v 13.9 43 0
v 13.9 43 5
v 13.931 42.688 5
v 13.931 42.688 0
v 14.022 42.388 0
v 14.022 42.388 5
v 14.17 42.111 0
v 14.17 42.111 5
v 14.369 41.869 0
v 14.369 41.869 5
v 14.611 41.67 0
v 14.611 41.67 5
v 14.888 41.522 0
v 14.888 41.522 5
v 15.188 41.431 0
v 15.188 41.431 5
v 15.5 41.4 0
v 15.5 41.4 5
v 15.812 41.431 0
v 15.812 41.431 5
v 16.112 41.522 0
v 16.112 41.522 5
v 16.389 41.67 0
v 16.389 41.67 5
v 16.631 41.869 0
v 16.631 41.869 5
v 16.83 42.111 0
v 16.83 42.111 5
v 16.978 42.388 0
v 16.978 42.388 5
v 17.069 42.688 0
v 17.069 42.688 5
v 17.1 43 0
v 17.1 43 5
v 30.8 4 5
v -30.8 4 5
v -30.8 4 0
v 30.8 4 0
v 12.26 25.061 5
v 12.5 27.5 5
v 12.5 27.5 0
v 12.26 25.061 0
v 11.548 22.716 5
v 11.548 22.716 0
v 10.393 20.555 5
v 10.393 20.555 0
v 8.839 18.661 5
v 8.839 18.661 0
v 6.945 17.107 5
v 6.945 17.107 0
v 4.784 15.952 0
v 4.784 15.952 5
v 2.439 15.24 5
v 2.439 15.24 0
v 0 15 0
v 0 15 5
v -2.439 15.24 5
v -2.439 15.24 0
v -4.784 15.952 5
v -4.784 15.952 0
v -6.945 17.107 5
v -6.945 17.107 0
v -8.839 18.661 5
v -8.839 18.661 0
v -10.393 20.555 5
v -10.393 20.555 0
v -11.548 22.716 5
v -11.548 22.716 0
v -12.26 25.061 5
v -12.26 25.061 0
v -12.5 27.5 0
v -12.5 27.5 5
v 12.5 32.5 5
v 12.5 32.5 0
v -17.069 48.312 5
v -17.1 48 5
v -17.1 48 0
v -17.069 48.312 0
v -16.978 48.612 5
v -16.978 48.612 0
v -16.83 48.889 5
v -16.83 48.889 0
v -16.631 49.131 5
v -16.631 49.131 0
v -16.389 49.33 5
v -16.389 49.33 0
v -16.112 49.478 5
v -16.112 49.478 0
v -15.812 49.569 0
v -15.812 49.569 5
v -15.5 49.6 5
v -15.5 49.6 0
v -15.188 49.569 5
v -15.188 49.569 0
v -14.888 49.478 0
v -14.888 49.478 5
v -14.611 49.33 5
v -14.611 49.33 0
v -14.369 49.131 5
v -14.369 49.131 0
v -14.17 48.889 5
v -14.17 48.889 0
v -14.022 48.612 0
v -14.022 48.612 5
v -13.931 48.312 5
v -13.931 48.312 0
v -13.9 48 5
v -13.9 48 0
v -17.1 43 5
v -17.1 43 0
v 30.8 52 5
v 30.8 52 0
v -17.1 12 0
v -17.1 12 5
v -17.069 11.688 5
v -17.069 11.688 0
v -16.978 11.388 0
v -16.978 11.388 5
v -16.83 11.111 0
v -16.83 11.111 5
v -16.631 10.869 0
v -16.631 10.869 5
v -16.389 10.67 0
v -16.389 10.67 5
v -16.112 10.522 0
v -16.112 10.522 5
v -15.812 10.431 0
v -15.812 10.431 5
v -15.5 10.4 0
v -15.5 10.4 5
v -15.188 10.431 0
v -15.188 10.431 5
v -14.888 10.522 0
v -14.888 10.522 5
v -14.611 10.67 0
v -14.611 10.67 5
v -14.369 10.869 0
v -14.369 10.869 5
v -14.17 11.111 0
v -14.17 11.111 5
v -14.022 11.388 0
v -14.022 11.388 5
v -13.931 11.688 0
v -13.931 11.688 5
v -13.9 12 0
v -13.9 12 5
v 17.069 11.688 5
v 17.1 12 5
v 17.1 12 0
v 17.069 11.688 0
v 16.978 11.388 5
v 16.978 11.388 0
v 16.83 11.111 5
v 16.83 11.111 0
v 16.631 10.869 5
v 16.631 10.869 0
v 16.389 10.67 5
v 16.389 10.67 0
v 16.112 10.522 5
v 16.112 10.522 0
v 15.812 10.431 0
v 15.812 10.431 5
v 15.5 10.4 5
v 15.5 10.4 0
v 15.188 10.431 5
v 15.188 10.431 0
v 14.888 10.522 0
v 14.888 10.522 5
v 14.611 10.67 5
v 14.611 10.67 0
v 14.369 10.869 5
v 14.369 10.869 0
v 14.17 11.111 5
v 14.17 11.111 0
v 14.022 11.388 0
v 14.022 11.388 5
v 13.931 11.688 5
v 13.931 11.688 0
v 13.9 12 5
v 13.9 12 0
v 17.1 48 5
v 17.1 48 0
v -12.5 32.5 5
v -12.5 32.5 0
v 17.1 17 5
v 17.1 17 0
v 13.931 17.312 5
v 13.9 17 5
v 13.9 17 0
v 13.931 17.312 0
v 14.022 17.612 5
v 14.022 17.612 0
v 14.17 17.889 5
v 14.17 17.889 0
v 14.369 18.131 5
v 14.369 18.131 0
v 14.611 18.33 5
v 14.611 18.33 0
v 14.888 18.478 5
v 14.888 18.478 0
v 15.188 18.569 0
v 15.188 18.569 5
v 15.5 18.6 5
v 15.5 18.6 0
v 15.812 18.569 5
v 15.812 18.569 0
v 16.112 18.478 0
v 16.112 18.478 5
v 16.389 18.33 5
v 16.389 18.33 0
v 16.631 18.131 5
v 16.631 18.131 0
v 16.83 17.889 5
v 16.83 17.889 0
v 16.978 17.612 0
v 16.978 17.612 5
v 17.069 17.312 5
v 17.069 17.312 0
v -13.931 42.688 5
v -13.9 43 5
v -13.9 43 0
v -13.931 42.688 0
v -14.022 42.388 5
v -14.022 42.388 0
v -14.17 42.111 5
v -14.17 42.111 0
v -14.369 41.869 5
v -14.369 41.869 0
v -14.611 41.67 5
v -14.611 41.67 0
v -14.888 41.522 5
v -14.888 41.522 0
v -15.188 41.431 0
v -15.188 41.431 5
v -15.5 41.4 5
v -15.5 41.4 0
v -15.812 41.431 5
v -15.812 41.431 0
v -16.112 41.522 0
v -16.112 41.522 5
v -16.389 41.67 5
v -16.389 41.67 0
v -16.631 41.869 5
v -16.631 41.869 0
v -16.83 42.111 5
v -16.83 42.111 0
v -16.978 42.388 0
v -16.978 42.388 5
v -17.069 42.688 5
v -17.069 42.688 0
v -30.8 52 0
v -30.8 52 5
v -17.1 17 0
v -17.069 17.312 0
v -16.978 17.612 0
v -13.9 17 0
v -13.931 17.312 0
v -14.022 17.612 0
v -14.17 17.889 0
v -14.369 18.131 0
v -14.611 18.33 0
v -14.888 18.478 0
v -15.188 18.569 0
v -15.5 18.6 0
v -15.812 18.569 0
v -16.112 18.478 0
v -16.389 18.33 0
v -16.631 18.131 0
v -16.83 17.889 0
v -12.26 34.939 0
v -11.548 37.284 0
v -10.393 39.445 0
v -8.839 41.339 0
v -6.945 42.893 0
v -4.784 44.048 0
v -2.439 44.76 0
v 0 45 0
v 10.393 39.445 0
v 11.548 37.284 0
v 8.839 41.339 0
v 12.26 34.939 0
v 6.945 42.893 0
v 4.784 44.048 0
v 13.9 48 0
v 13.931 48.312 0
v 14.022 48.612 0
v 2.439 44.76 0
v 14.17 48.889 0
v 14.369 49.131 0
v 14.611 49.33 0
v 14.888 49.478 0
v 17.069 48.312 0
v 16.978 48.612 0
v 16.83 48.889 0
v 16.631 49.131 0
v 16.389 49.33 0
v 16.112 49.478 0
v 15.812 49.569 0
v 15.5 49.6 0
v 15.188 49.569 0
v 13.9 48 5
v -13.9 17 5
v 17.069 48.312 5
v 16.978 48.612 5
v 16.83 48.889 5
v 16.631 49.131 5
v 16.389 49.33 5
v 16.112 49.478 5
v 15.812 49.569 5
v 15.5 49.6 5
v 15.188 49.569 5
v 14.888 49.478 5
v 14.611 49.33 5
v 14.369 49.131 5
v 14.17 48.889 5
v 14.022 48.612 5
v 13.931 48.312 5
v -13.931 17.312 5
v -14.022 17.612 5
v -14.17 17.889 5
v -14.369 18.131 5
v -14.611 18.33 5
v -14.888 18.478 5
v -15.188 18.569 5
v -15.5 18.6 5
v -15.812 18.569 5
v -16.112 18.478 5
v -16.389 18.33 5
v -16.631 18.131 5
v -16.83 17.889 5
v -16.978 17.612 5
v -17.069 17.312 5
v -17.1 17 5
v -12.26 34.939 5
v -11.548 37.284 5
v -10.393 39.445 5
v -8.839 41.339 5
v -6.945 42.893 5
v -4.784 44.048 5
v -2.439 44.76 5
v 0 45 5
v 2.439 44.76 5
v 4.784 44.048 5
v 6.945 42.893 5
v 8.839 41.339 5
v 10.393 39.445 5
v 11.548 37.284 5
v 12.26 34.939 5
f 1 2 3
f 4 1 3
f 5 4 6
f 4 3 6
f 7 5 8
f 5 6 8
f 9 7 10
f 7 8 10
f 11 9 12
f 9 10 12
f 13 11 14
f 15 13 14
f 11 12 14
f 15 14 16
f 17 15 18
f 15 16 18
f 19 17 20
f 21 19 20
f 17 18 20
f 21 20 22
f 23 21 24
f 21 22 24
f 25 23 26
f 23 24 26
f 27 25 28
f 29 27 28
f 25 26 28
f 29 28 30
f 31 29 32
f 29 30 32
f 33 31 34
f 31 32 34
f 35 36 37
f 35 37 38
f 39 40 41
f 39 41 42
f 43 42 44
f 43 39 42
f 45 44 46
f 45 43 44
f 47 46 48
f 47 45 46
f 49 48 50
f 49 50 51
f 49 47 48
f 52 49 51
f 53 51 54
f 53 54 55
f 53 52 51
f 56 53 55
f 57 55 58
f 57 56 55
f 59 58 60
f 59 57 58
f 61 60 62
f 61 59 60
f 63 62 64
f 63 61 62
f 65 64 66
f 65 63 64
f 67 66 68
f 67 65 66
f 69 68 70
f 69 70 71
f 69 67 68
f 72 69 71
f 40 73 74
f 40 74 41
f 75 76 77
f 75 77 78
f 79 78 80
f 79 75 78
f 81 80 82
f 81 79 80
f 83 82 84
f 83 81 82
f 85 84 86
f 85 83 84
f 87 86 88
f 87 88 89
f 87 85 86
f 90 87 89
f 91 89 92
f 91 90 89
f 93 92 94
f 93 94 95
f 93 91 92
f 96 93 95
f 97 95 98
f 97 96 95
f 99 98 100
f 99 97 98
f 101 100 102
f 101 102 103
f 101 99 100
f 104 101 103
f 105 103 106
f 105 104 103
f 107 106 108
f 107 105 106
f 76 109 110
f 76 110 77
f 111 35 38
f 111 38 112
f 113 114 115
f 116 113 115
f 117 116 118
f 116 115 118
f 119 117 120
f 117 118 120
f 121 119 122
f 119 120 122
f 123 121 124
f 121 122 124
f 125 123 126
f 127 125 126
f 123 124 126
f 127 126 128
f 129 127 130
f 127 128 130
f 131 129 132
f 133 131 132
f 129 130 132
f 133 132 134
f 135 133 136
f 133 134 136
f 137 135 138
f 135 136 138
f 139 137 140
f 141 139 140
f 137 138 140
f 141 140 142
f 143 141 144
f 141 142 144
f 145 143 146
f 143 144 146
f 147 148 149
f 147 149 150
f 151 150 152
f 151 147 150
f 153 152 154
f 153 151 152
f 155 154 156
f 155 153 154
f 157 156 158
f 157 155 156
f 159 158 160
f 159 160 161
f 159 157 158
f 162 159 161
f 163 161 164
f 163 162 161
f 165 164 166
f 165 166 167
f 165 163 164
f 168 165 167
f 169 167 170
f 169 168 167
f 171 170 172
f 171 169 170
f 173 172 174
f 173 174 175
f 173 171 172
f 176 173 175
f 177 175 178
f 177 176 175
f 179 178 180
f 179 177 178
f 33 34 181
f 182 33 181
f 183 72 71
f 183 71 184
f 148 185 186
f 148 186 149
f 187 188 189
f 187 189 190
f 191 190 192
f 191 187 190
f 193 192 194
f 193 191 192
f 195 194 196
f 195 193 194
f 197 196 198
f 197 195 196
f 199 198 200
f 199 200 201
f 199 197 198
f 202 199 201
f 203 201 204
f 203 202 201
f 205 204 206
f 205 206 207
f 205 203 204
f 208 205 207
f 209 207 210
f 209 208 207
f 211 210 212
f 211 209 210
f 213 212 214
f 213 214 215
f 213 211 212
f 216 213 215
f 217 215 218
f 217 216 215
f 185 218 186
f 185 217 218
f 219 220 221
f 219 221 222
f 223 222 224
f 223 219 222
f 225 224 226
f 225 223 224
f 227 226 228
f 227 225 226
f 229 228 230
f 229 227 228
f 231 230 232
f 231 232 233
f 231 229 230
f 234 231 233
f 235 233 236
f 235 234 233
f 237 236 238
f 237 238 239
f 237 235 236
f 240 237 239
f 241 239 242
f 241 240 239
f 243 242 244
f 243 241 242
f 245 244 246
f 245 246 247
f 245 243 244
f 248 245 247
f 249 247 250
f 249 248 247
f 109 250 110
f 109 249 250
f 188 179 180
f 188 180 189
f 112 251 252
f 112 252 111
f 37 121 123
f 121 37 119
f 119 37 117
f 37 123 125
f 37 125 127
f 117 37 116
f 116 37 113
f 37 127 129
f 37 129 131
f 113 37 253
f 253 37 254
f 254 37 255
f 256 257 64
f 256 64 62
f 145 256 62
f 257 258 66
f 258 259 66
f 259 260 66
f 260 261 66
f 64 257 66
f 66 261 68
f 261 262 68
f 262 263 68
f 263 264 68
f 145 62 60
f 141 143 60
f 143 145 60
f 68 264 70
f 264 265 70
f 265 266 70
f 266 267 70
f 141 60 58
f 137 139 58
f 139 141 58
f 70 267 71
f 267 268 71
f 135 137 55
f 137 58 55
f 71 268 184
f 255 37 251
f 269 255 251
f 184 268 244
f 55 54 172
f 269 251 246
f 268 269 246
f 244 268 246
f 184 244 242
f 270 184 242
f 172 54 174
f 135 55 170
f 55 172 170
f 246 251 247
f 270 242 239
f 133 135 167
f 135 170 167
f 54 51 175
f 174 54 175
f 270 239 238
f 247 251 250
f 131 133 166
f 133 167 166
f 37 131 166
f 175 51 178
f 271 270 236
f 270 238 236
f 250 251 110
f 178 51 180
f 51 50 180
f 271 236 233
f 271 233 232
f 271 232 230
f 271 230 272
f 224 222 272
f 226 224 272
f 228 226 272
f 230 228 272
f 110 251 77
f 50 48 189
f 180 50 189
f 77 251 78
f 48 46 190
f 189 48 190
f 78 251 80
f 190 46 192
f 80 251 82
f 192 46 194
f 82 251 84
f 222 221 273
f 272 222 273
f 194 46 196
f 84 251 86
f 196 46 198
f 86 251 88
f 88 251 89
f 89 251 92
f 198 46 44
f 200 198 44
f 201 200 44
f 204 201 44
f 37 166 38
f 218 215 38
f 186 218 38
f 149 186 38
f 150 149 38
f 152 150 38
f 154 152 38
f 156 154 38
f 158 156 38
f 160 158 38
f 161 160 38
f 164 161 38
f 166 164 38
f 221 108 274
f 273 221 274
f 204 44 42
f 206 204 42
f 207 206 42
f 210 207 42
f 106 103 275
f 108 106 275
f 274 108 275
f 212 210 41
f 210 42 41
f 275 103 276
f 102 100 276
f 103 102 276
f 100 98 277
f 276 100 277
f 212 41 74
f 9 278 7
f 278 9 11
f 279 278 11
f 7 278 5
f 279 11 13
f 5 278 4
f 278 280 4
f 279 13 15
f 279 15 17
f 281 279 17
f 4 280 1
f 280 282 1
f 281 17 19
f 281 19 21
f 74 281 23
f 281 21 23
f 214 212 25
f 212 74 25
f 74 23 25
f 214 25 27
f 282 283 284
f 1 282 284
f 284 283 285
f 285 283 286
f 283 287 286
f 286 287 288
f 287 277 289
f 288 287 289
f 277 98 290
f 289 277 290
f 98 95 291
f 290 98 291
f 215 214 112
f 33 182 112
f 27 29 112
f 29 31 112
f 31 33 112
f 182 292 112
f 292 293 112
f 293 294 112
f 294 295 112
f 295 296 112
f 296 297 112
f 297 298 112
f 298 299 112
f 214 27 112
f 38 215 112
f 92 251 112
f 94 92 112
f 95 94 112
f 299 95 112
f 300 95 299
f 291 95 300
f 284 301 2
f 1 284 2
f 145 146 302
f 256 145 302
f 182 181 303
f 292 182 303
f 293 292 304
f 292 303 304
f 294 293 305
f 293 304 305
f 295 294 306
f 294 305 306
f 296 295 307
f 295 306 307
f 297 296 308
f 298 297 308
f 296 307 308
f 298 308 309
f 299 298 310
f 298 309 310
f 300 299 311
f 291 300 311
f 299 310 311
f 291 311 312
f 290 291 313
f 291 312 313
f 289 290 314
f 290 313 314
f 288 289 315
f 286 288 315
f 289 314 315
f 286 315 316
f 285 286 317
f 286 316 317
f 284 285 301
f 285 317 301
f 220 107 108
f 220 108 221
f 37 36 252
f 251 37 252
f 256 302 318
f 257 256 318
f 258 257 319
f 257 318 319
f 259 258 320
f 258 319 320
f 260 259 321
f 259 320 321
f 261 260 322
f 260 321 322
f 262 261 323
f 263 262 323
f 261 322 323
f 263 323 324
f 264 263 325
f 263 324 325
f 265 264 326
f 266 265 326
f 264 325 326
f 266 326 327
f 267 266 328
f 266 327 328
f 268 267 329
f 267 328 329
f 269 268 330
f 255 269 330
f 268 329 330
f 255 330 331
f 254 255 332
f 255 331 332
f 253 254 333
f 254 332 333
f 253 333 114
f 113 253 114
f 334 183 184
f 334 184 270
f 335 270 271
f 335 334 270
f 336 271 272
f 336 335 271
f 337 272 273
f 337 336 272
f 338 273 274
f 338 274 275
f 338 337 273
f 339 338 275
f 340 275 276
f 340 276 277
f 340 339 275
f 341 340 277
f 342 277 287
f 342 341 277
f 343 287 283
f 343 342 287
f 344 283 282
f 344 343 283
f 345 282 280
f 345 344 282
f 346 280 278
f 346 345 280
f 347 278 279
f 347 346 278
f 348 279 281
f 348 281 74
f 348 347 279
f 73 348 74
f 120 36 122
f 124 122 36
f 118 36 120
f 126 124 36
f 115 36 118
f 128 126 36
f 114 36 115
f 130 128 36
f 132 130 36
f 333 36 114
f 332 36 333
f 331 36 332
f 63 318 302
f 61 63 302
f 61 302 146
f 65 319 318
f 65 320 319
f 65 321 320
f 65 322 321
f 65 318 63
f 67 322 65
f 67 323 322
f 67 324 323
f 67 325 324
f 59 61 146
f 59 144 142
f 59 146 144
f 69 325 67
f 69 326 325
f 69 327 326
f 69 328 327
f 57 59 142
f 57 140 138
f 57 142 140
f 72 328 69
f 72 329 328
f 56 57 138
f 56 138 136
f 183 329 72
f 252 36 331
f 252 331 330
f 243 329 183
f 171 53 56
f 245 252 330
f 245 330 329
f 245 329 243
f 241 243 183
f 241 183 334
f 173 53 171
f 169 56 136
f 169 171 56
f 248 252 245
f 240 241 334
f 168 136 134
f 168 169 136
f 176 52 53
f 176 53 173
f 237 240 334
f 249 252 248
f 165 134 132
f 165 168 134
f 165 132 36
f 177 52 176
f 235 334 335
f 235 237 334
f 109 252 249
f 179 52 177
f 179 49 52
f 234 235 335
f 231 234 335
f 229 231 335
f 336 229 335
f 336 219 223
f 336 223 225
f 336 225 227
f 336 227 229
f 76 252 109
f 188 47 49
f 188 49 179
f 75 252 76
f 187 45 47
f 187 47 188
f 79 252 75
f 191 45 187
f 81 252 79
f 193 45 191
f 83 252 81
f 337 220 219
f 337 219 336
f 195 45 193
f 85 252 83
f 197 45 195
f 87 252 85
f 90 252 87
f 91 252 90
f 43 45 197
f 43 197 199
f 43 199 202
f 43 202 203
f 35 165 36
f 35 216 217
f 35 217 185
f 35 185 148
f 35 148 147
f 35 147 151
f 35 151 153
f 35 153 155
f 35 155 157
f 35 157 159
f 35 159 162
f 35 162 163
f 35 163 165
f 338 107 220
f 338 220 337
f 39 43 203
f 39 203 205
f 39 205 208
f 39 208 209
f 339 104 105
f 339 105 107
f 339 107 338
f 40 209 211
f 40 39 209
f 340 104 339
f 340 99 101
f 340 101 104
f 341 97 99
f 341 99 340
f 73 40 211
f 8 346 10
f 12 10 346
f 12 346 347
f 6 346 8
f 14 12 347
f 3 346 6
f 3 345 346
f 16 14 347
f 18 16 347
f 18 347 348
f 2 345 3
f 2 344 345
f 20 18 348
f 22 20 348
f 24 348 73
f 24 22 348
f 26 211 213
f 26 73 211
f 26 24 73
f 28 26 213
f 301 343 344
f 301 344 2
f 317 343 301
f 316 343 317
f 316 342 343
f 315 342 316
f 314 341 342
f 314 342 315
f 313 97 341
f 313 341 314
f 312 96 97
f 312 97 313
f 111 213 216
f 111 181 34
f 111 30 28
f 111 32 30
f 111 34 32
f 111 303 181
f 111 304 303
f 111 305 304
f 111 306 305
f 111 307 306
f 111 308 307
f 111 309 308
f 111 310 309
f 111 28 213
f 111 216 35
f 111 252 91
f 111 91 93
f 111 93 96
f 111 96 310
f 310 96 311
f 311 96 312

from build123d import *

# Parameters (mm, degrees)
SKETCH1_W           = 61.6
SKETCH1_H           = 42
BOSS_EXTRUDE1_DEPTH = 5
CUT_EXTRUDE1_DEPTH  = 5
SKETCH3_W           = 61.6
SKETCH3_H           = 6
BOSS_EXTRUDE2_DEPTH = 5


with BuildPart() as part:
    # Sketch1 → Boss-Extrude1 (new body)
    with BuildSketch(Plane.XY):
        with Locations((0, 31)):
            Rectangle(SKETCH1_W, SKETCH1_H)
    extrude(amount=BOSS_EXTRUDE1_DEPTH)

    # Sketch2 → Cut-Extrude1 (cut)
    with BuildSketch(Plane.XY.offset(5)):
        with BuildLine():
            Line((-12.5, 27.5), (-12.5, 32.5))
            ThreePointArc((-12.5, 32.5), (0, 45), (12.5, 32.5))
            Line((12.5, 32.5), (12.5, 27.5))
            ThreePointArc((12.5, 27.5), (0, 15), (-12.5, 27.5))
        make_face()
        with BuildLine():
            Line((-17.1, 45.5), (-17.1, 48))
            ThreePointArc((-17.1, 48), (-15.5, 49.6), (-13.9, 48))
            Line((-13.9, 48), (-13.9, 45.5))
            Line((-13.9, 45.5), (-13.9, 43))
            ThreePointArc((-13.9, 43), (-15.5, 41.4), (-17.1, 43))
            Line((-17.1, 43), (-17.1, 45.5))
        make_face()
        with BuildLine():
            Line((-17.1, 14.5), (-17.1, 12))
            ThreePointArc((-17.1, 12), (-15.5, 10.4), (-13.9, 12))
            Line((-13.9, 12), (-13.9, 14.5))
            Line((-13.9, 14.5), (-13.9, 17))
            ThreePointArc((-13.9, 17), (-15.5, 18.6), (-17.1, 17))
            Line((-17.1, 17), (-17.1, 14.5))
        make_face()
        with BuildLine():
            Line((13.9, 12), (13.9, 14.5))
            Line((13.9, 14.5), (13.9, 17))
            ThreePointArc((13.9, 17), (15.5, 18.6), (17.1, 17))
            Line((17.1, 17), (17.1, 14.5))
            Line((17.1, 14.5), (17.1, 12))
            ThreePointArc((17.1, 12), (15.5, 10.4), (13.9, 12))
        make_face()
        with BuildLine():
            Line((17.1, 45.5), (17.1, 48))
            ThreePointArc((17.1, 48), (15.5, 49.6), (13.9, 48))
            Line((13.9, 48), (13.9, 45.5))
            Line((13.9, 45.5), (13.9, 43))
            ThreePointArc((13.9, 43), (15.5, 41.4), (17.1, 43))
            Line((17.1, 43), (17.1, 45.5))
        make_face()
    extrude(amount=-CUT_EXTRUDE1_DEPTH, mode=Mode.SUBTRACT)

    # Sketch3 → Boss-Extrude2 (add)
    with BuildSketch(Plane.XY.offset(5)):
        with Locations((0, 7)):
            Rectangle(SKETCH3_W, SKETCH3_H)
    extrude(amount=-BOSS_EXTRUDE2_DEPTH)


solid = part.part
